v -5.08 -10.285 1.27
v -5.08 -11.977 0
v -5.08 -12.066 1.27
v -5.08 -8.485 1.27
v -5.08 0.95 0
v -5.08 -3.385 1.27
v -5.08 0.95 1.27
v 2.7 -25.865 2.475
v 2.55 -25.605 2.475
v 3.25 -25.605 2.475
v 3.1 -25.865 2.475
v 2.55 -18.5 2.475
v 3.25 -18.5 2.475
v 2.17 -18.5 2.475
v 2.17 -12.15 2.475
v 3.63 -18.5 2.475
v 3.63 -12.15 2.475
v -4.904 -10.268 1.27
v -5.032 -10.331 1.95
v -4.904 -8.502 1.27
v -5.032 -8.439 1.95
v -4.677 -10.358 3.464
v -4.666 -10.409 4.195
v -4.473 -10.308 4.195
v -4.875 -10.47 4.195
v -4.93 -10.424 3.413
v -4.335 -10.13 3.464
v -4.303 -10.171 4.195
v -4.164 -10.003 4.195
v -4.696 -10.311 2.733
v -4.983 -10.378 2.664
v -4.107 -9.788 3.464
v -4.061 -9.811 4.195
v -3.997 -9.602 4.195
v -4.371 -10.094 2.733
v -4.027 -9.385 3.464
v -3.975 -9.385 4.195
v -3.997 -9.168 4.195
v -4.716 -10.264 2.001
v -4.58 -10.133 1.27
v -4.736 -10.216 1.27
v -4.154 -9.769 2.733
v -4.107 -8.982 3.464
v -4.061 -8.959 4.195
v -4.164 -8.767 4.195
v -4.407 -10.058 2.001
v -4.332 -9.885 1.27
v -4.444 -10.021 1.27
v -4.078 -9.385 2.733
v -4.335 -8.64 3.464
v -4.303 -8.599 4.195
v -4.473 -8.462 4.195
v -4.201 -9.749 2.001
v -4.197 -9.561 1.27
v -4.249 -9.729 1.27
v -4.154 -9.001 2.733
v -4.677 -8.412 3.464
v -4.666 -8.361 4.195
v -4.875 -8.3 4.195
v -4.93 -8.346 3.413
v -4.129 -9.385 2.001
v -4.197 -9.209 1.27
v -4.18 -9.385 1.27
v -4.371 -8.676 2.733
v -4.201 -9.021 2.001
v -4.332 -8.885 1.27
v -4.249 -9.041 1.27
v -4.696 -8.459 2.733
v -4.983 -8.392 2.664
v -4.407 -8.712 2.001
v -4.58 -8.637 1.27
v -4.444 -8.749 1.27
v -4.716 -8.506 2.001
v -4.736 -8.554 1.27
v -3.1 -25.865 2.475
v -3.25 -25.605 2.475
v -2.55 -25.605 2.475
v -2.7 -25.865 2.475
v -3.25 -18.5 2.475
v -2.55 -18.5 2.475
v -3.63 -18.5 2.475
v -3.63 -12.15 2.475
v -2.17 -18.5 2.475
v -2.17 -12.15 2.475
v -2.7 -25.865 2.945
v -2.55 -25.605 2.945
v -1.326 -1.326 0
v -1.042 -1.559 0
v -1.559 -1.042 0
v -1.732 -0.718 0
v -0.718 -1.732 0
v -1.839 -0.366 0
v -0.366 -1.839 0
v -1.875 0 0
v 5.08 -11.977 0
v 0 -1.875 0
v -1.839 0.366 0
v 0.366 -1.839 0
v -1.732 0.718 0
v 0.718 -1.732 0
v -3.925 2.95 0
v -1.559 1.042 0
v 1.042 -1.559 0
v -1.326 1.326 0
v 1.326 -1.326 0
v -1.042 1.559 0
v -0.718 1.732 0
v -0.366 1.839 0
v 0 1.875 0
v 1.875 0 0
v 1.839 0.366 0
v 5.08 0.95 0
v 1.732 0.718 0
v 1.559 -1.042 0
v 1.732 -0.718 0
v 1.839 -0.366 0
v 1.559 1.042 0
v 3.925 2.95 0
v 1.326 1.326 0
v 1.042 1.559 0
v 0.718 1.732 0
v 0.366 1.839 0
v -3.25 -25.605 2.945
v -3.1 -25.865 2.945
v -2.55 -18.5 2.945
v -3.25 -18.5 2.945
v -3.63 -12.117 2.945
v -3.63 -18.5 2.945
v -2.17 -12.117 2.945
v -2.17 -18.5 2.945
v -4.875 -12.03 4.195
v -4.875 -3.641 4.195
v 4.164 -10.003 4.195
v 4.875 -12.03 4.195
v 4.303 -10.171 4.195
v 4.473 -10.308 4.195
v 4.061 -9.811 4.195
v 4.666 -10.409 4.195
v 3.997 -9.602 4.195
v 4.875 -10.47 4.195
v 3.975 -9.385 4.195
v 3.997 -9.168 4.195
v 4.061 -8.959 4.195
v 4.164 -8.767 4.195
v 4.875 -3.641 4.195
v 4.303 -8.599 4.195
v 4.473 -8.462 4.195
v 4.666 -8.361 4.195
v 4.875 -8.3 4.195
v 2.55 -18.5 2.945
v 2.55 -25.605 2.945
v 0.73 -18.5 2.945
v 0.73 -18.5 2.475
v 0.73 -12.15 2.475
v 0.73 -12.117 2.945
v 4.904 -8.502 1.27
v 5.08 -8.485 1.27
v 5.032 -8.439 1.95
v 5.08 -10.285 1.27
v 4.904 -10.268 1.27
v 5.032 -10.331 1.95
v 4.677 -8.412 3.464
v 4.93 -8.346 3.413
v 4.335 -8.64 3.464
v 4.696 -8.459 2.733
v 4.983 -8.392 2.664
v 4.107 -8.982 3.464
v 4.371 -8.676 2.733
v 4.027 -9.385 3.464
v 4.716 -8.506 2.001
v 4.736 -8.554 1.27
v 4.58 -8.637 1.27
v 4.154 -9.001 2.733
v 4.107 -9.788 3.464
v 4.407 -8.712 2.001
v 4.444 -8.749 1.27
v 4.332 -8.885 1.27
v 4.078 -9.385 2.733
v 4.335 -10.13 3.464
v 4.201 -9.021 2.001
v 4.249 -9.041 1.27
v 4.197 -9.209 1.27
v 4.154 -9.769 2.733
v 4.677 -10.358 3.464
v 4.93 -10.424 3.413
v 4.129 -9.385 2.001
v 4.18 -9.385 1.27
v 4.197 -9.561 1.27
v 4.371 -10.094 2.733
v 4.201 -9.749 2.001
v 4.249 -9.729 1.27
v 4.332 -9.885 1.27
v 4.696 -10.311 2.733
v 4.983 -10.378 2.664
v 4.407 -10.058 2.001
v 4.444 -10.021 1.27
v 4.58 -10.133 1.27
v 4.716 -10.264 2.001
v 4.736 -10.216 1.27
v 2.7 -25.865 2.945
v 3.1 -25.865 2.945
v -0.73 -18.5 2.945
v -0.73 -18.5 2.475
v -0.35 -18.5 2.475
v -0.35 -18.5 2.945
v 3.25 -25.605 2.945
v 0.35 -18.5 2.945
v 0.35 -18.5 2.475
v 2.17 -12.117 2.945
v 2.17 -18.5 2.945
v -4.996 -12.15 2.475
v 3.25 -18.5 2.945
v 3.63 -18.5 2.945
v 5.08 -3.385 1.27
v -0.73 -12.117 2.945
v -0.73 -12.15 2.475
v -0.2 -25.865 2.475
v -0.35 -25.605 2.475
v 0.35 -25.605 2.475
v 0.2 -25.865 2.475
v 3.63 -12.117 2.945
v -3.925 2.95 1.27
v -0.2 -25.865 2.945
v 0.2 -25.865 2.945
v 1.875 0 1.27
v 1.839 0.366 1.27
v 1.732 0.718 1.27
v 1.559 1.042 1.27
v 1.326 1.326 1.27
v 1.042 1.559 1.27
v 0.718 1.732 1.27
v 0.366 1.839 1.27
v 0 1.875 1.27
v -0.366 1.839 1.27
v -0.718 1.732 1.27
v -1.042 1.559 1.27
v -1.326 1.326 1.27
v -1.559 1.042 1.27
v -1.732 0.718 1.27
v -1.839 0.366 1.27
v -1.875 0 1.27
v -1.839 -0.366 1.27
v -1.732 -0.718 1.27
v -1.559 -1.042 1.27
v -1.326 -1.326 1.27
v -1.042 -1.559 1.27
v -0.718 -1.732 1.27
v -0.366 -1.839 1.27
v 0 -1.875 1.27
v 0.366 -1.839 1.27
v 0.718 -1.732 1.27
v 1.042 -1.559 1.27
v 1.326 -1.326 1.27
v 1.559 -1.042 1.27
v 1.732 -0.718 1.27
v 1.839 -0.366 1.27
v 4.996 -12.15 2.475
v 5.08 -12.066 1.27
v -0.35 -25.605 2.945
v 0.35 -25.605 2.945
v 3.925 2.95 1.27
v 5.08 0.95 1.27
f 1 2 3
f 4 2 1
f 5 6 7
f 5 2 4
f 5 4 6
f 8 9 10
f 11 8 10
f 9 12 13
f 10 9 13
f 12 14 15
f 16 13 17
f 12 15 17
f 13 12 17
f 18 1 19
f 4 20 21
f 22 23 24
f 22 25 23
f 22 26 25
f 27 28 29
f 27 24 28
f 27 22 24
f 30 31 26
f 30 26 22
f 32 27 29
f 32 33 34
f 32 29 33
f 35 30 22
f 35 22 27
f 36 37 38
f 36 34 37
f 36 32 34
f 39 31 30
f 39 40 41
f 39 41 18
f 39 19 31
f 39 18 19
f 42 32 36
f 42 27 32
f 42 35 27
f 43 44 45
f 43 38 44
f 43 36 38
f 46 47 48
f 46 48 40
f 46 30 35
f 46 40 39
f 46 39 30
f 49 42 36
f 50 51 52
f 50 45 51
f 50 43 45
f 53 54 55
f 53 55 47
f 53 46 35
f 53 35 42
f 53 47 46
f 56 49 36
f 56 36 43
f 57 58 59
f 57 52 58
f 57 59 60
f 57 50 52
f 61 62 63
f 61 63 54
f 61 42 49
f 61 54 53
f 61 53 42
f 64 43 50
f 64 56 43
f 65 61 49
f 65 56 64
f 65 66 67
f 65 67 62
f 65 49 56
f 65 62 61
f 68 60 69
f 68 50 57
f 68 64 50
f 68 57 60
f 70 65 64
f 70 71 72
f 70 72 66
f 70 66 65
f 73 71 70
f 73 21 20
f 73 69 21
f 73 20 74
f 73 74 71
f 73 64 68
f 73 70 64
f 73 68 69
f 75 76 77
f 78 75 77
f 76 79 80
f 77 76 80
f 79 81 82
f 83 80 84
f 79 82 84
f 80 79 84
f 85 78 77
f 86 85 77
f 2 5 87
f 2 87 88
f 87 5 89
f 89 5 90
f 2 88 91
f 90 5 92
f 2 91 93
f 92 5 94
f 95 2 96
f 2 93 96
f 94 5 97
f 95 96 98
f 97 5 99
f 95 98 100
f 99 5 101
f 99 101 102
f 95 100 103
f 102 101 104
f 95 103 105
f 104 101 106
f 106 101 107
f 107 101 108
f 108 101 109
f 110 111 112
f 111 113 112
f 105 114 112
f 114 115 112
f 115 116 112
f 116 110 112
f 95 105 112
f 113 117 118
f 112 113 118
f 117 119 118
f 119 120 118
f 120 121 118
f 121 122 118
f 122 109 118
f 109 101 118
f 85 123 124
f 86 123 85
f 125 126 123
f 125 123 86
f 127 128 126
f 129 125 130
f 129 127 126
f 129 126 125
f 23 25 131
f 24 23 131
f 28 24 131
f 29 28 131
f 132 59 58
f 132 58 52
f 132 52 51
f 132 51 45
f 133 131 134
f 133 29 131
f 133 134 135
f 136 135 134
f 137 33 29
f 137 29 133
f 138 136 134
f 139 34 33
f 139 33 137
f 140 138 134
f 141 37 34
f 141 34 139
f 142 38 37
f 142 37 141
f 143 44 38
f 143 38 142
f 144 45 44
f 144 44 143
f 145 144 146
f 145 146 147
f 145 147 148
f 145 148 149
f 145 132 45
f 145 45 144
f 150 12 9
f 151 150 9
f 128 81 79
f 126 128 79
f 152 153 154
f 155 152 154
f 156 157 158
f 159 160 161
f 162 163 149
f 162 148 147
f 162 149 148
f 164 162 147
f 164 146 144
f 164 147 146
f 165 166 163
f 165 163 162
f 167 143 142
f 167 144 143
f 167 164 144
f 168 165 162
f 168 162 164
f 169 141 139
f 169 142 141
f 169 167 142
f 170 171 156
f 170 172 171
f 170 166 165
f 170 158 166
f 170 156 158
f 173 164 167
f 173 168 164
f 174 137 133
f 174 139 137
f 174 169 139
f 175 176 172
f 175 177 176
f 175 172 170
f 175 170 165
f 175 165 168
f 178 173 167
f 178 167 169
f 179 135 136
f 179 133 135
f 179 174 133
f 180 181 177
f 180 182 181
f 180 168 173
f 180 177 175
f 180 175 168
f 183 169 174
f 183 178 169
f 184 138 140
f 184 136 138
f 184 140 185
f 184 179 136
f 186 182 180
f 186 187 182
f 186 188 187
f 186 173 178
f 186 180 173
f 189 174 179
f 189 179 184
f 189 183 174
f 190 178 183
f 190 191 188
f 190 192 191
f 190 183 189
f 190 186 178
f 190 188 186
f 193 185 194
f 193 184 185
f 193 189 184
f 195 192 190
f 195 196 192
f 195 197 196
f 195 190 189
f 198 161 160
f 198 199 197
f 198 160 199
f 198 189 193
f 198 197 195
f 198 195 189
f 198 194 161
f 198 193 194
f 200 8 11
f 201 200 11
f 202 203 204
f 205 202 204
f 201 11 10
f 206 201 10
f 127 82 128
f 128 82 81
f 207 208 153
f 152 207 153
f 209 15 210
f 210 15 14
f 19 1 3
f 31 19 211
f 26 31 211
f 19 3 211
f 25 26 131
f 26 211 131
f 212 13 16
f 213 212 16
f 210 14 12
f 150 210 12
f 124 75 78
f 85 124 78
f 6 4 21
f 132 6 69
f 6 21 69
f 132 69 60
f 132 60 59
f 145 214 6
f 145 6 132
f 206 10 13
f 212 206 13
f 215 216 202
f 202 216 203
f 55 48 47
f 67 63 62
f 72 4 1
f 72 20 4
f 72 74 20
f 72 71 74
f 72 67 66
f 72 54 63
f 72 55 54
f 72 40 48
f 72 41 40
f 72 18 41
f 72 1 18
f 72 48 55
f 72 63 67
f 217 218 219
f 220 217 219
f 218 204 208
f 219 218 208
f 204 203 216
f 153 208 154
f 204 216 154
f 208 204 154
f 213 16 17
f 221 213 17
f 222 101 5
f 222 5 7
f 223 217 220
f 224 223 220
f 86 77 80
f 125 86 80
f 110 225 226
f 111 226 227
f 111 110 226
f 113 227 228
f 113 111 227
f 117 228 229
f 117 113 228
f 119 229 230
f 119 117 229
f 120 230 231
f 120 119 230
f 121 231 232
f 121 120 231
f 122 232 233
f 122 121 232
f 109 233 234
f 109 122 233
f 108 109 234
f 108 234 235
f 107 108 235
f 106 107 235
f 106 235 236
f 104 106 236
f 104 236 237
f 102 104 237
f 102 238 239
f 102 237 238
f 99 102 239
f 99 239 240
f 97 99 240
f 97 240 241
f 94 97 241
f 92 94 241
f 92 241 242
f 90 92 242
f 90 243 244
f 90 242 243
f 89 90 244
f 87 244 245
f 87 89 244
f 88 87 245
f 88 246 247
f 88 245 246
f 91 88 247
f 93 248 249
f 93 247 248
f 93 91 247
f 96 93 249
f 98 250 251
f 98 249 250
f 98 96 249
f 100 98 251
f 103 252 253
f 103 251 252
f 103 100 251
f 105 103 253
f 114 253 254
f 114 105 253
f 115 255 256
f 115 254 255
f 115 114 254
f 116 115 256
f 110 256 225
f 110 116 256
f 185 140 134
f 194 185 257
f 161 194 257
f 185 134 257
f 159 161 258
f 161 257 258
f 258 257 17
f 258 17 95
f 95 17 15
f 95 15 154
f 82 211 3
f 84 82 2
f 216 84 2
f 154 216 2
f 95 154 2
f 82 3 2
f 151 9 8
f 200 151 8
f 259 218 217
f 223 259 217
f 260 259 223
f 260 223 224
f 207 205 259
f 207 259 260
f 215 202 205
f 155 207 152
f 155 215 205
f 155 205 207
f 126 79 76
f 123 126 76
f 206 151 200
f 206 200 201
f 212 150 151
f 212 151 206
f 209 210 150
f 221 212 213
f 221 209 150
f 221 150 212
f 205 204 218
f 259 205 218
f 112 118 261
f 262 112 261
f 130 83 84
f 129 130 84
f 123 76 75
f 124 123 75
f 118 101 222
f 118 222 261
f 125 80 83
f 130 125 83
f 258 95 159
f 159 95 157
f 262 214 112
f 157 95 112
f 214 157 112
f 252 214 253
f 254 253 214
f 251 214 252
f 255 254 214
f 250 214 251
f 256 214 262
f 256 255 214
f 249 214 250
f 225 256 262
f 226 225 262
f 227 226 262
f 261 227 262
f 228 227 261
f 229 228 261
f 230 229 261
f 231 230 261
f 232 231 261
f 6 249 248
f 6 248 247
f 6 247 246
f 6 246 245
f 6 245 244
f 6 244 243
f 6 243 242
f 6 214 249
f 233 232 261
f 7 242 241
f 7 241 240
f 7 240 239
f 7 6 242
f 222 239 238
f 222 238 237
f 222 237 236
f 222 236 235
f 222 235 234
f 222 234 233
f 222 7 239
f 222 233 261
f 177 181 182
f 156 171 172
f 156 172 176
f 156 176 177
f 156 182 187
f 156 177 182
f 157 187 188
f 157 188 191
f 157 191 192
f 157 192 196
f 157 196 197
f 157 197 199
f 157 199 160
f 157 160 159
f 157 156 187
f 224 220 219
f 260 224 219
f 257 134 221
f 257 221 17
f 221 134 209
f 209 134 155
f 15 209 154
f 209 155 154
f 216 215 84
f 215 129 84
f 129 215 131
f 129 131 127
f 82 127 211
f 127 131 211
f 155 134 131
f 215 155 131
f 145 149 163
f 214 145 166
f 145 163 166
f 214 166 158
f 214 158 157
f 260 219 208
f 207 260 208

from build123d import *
from OCP.BRepFilletAPI import BRepFilletAPI_MakeChamfer

# Parameters (mm, degrees)
SKIZZE1_W                                 = 10.16
SKIZZE1_H                                 = 8.765
SKIZZE1_H_2                               = 6.335
SKIZZE1_R                                 = 1.875
AUFSATZ_LINEAR_AUSTRAGEN1_DEPTH           = 4.195
SCHNITT_LINEAR_AUSTRAGEN1_DEPTH           = 14.821249039
SCHNITT_LINEAR_AUSTRAGEN1_DEPTH_BACK      = 14.821249039
SCHNITT_LINEAR_AUSTRAGEN2_DEPTH           = 14.821249039
SCHNITT_LINEAR_AUSTRAGEN2_DEPTH_BACK      = 14.821249039
AUFSATZ_LINEAR_AUSTRAGEN2_DEPTH           = 0.47
SKIZZE6_R                                 = 0.9
SCHNITT_LINEAR_AUSTRAGEN3_DEPTH           = 27.52093984
SCHNITT_LINEAR_AUSTRAGEN3_DRAFT           = -4
SCHNITT_LINEAR_AUSTRAGEN3_PROFILE_2_DEPTH = 27.52093984
SCHNITT_LINEAR_AUSTRAGEN3_PROFILE_2_DRAFT = -4
FASE1_SIZE                                = 2
FASE1_SIZE2                               = 1.154700538


with BuildPart() as part:
    # Skizze1 → Aufsatz-Linear austragen1 (new body)
    # profile 1 of 2: a face of its own
    with BuildSketch(Plane.XY):
        with Locations((0, -7.7675)):
            Rectangle(SKIZZE1_W, SKIZZE1_H)
    # profile 2 of 2: a face of its own
    with BuildSketch(Plane.XY):
        with Locations((0, -0.2175)):
            Rectangle(SKIZZE1_W, SKIZZE1_H_2)
        Circle(SKIZZE1_R, mode=Mode.SUBTRACT)
    extrude(amount=AUFSATZ_LINEAR_AUSTRAGEN1_DEPTH)

    # Skizze3 → Schnitt-Linear austragen1 (cut, two sides: drawn at the far end of the back side and taken through both)
    with BuildSketch(Plane(origin=(0, 0, 0), x_dir=(0, 0, -1), z_dir=(1, 0, 0)).offset(-SCHNITT_LINEAR_AUSTRAGEN1_DEPTH_BACK)):
        Polygon((-1.27, 43.960404594), (-1.27, 2.95), (-1.27, -3.385), (-4.195, -3.640904341), (-4.195, -12.029725883), (-2.475, -12.15), (0, -11.97693114), (40.91050531, -9.116189929), (-23.302349016, -60.146793289), (-65.482854325, -7.070198766), align=None)
    extrude(amount=SCHNITT_LINEAR_AUSTRAGEN1_DEPTH + SCHNITT_LINEAR_AUSTRAGEN1_DEPTH_BACK, mode=Mode.SUBTRACT)

    # Skizze4 → Schnitt-Linear austragen2 (cut, two sides: drawn at the far end of the back side and taken through both)
    with BuildSketch(Plane(origin=(0, 0, 0), x_dir=(1, 0, 0), z_dir=(0, 1, 0)).offset(-SCHNITT_LINEAR_AUSTRAGEN2_DEPTH_BACK)):
        Polygon((-7.252588261, 29.799459635), (-5.08, -1.27), (-4.875464075, -4.195), (4.875464075, -4.195), (5.08, -1.27), (7.252588261, 29.799459635), (7.252588261, -32.491196543), (-7.252588261, -32.491196543), align=None)
    extrude(amount=SCHNITT_LINEAR_AUSTRAGEN2_DEPTH + SCHNITT_LINEAR_AUSTRAGEN2_DEPTH_BACK, mode=Mode.SUBTRACT)

    # Skizze5 → Aufsatz-Linear austragen2 (add)
    with BuildSketch(Plane.XY.offset(2.475)):
        Polygon((-3.63, -11.15), (-3.63, -18.5), (-3.25, -18.5), (-3.25, -25.605192379), (-3.1, -25.865), (-2.7, -25.865), (-2.55, -25.605192379), (-2.55, -18.5), (-2.17, -18.5), (-2.17, -11.15), align=None)
        Polygon((-0.73, -11.15), (-0.73, -18.5), (-0.35, -18.5), (-0.35, -25.605192379), (-0.2, -25.865), (0.2, -25.865), (0.35, -25.605192379), (0.35, -18.5), (0.73, -18.5), (0.73, -11.15), align=None)
        Polygon((2.17, -11.15), (2.17, -18.5), (2.55, -18.5), (2.55, -25.605192379), (2.7, -25.865), (3.1, -25.865), (3.25, -25.605192379), (3.25, -18.5), (3.63, -18.5), (3.63, -11.15), align=None)
    extrude(amount=AUFSATZ_LINEAR_AUSTRAGEN2_DEPTH)


with BuildPart() as schnitt_linear_austragen3_tool:
    # Skizze6 → Schnitt-Linear austragen3 (with draft: the straight prism first)
    with BuildSketch(Plane.XY.offset(1.27)):
        with Locations((-5.08, -9.385)):
            Circle(SKIZZE6_R)
    extrude(amount=SCHNITT_LINEAR_AUSTRAGEN3_DEPTH)
    # Schnitt-Linear austragen3: the draft: its side faces are tilted about the plane it starts from
    schnitt_linear_austragen3_sides = [schnitt_linear_austragen3_tool.faces().sort_by_distance(p)[0] for p in [
        (-5.98, -9.385, 15.03046992),
    ]]
    draft(schnitt_linear_austragen3_sides, Plane.XY.offset(1.27), SCHNITT_LINEAR_AUSTRAGEN3_DRAFT)


with BuildPart() as part_1:
    add(part.part)

    # Schnitt-Linear austragen3: cut by schnitt_linear_austragen3_tool
    add(schnitt_linear_austragen3_tool.part, mode=Mode.SUBTRACT)


with BuildPart() as schnitt_linear_austragen3_profile_2_tool:
    # Skizze6 → Schnitt-Linear austragen3 profile 2 (with draft: the straight prism first)
    with BuildSketch(Plane.XY.offset(1.27)):
        with Locations((5.08, -9.385)):
            Circle(SKIZZE6_R)
    extrude(amount=SCHNITT_LINEAR_AUSTRAGEN3_PROFILE_2_DEPTH)
    # Schnitt-Linear austragen3 profile 2: the draft: its side faces are tilted about the plane it starts from
    schnitt_linear_austragen3_profile_2_sides = [schnitt_linear_austragen3_profile_2_tool.faces().sort_by_distance(p)[0] for p in [
        (4.18, -9.385, 15.03046992),
    ]]
    draft(schnitt_linear_austragen3_profile_2_sides, Plane.XY.offset(1.27), SCHNITT_LINEAR_AUSTRAGEN3_PROFILE_2_DRAFT)


with BuildPart() as part_2:
    add(part_1.part)

    # Schnitt-Linear austragen3 profile 2: cut by schnitt_linear_austragen3_profile_2_tool
    add(schnitt_linear_austragen3_profile_2_tool.part, mode=Mode.SUBTRACT)

    # Fase1: one chamfer whose edges measure the first distance from different faces: ONE call of the kernel's chamfer builder (chamfer() names one face for all edges)
    fase1_edges_1 = [part_2.edges().sort_by_distance(p)[0] for p in [
        (-5.08, 2.95, 0.635),
    ]]
    fase1_side_1 = [part_2.faces().sort_by_distance(p)[0] for p in [
        (-5.08, -4.535689282, 0.635627783),
    ]]
    fase1_edges_2 = [part_2.edges().sort_by_distance(p)[0] for p in [
        (5.08, 2.95, 0.635),
    ]]
    fase1_side_2 = [part_2.faces().sort_by_distance(p)[0] for p in [
        (5.08, -4.535689282, 0.635627783),
    ]]
    fase1 = BRepFilletAPI_MakeChamfer(part_2.part.solid().wrapped)
    for e in fase1_edges_1:
        fase1.Add(FASE1_SIZE, FASE1_SIZE2, e.wrapped, fase1_side_1[0].wrapped)  # the first distance lies on this face
    for e in fase1_edges_2:
        fase1.Add(FASE1_SIZE, FASE1_SIZE2, e.wrapped, fase1_side_2[0].wrapped)  # the first distance lies on this face
    add(Compound.cast(fase1.Shape()), mode=Mode.REPLACE)


solid = part_2.part
